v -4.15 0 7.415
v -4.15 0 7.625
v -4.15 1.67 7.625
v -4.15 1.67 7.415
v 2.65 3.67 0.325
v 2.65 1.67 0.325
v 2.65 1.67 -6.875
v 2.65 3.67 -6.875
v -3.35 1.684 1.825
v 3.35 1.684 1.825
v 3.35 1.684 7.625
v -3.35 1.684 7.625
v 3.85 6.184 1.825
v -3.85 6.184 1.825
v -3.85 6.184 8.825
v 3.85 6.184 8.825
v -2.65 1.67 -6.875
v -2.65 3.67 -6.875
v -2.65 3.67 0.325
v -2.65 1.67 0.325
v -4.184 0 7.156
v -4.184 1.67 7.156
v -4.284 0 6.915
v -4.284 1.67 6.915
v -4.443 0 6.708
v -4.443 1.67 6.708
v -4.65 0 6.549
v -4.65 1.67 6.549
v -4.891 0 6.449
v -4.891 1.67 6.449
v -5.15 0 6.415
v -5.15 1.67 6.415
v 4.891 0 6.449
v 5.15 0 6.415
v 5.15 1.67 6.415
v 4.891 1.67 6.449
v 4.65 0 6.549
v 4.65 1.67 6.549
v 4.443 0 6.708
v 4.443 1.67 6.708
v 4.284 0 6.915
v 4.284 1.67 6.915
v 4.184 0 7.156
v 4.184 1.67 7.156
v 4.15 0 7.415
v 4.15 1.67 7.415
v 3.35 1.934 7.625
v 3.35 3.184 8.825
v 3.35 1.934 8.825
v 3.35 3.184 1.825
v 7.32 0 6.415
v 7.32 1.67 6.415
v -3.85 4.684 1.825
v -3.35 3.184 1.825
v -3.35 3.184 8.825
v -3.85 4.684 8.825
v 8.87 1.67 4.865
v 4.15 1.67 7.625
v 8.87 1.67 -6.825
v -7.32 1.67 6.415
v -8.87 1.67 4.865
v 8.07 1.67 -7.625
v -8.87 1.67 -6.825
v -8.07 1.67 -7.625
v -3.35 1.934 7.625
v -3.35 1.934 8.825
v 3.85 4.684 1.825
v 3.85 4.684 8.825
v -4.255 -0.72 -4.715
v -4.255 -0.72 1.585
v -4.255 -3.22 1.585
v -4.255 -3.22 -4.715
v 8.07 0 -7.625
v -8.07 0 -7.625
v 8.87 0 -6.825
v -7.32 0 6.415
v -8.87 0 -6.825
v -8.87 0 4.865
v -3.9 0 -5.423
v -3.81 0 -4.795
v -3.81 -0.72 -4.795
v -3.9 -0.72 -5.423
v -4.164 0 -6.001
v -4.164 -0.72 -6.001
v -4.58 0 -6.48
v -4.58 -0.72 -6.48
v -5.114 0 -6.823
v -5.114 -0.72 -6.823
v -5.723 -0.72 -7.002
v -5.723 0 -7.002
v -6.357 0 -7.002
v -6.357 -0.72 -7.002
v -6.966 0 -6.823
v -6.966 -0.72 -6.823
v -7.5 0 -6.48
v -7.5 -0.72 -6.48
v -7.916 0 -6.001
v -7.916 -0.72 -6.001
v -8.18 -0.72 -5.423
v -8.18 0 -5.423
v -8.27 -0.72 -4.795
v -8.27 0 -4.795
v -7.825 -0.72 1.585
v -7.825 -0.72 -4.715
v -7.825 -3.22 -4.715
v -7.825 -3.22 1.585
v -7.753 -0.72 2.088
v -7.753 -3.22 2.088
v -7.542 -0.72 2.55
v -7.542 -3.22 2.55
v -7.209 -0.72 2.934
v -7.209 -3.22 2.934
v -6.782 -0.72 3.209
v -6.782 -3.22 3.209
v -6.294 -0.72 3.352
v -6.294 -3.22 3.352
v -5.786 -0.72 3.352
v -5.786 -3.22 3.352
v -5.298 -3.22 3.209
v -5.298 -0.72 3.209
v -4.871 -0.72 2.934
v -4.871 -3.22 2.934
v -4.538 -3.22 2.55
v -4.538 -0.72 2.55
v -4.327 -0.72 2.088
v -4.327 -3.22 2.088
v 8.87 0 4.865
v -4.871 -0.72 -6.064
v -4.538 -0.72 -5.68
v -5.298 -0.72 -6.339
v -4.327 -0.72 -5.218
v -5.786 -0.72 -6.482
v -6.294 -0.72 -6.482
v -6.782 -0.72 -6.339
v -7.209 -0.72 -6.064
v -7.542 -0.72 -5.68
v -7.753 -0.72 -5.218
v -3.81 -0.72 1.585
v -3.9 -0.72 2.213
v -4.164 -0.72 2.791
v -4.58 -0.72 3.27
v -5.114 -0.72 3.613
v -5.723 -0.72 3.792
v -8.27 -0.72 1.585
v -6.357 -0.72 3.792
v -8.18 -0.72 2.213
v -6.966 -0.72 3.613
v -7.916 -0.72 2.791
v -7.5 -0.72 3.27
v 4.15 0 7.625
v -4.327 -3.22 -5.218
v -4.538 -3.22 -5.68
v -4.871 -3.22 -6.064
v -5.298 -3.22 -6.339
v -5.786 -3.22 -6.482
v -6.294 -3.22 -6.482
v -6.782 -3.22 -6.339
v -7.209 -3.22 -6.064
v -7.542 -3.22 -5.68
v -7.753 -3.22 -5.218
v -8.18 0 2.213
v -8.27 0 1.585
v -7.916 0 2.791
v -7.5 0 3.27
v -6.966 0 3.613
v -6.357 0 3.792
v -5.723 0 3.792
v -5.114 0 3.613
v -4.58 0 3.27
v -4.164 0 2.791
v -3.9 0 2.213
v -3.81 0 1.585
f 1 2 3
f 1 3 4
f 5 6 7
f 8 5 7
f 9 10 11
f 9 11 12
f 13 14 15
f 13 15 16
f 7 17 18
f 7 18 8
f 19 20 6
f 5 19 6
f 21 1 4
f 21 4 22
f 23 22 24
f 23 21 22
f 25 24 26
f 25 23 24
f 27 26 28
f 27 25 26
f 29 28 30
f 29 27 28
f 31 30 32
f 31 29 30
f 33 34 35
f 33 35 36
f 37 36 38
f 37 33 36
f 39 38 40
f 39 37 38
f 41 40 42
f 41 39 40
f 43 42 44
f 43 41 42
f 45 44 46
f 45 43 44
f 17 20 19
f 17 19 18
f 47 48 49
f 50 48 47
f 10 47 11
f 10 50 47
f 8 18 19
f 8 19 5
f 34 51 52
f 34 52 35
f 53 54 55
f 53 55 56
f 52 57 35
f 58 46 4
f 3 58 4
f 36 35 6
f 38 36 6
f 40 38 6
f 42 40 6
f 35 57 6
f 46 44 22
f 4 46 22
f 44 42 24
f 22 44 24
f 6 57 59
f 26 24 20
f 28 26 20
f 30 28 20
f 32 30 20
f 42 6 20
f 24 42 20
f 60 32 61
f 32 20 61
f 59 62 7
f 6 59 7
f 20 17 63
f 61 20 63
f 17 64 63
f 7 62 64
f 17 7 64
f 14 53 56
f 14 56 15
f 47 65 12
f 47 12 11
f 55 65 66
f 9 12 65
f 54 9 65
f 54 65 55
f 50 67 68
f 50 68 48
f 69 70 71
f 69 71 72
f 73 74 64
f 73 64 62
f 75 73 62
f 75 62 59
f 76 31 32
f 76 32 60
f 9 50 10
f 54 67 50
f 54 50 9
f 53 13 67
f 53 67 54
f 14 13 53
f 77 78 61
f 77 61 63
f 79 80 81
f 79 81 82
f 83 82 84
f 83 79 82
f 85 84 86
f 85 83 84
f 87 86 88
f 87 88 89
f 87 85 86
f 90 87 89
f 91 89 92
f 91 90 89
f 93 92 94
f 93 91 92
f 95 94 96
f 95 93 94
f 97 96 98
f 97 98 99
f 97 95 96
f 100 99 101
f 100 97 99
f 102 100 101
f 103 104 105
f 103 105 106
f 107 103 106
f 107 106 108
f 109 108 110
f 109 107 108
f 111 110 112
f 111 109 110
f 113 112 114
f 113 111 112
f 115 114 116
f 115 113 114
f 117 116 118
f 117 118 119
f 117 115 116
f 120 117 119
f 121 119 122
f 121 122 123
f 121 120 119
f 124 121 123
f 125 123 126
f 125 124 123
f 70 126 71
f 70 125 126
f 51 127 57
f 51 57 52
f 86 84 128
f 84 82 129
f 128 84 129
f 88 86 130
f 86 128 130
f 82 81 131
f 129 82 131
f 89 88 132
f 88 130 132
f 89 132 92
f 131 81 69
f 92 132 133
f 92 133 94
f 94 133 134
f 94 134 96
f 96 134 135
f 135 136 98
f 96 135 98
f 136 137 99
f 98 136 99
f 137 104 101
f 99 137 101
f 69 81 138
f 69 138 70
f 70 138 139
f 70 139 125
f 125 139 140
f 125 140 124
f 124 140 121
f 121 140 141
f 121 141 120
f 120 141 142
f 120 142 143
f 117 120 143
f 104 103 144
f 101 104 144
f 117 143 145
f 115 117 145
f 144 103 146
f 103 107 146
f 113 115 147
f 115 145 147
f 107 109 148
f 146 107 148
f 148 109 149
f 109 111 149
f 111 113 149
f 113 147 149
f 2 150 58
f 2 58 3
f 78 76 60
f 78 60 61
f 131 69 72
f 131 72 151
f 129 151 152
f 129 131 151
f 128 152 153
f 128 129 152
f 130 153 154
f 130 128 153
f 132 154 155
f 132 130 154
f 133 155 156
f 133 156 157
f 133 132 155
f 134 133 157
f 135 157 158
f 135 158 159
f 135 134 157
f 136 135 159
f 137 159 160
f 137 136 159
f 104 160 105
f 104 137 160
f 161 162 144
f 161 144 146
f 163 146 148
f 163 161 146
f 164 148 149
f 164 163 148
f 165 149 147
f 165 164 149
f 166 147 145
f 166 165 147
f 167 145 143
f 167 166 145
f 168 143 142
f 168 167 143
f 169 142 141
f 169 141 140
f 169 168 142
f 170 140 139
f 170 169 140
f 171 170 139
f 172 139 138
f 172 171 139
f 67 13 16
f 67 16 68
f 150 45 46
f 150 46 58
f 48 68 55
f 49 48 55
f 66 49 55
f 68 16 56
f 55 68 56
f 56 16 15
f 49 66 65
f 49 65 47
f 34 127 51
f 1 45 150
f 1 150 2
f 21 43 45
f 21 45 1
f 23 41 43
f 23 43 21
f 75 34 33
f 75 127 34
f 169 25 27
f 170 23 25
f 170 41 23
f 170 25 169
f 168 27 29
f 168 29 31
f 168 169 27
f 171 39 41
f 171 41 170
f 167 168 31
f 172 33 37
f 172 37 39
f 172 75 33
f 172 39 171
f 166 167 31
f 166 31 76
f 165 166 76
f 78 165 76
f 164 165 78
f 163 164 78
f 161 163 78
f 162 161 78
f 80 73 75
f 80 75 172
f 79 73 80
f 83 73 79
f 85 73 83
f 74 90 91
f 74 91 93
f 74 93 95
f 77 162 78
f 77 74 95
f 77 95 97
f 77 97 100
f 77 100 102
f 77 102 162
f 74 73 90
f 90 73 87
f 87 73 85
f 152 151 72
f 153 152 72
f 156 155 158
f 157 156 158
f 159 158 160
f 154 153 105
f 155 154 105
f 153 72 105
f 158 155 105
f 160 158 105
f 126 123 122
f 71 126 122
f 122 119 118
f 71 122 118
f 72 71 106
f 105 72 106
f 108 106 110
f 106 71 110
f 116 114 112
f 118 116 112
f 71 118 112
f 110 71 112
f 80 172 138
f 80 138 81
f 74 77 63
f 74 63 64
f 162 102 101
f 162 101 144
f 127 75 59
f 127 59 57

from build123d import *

# Parameters (mm, degrees)
PCB_DEPTH           = 1.67
SKETCH2_W           = 5.3
SKETCH2_H           = 7.2
PIC18_DEPTH         = 2
CRYSTAL_DEPTH       = 0.72
BOSS_EXTRUDE4_DEPTH = 2.5
USB_CONNECTOR_DEPTH = 7
SKETCH6_W           = 6.7
SKETCH6_H           = 0.25
CUT_EXTRUDE1_DEPTH  = 1.2


with BuildPart() as part:
    # PCB Sketch → PCB (new body)
    with BuildSketch(Plane(origin=(0, 0, 0), x_dir=(1, 0, 0), z_dir=(0, 1, 0))):
        with BuildLine():
            Line((-8.07, 7.625), (8.07, 7.625))
            Line((8.07, 7.625), (8.87, 6.825))
            Line((8.87, 6.825), (8.87, -4.865))
            Line((8.87, -4.865), (7.32, -6.415))
            Line((7.32, -6.415), (5.15, -6.415))
            ThreePointArc((5.15, -6.415), (4.442893219, -6.707893219), (4.15, -7.415))
            Line((4.15, -7.415), (4.15, -7.625))
            Line((4.15, -7.625), (-4.15, -7.625))
            Line((-4.15, -7.625), (-4.15, -7.415))
            ThreePointArc((-4.15, -7.415), (-4.442893219, -6.707893219), (-5.15, -6.415))
            Line((-5.15, -6.415), (-7.32, -6.415))
            Line((-7.32, -6.415), (-8.87, -4.865))
            Line((-8.87, -4.865), (-8.87, 6.825))
            Line((-8.87, 6.825), (-8.07, 7.625))
        make_face()
    extrude(amount=PCB_DEPTH)

    # Sketch2 → PIC18 (add)
    with BuildSketch(Plane(origin=(0, 1.67, 0), x_dir=(1, 0, 0), z_dir=(0, 1, 0))):
        with Locations((0, 3.275)):
            Rectangle(SKETCH2_W, SKETCH2_H)
    extrude(amount=PIC18_DEPTH)

    # Sketch3 → Crystal (add)
    with BuildSketch(Plane.XZ):
        with BuildLine():
            Line((-3.81, 1.585), (-3.81, -4.795))
            ThreePointArc((-3.81, -4.795), (-6.04, -7.025), (-8.27, -4.795))
            Line((-8.27, -4.795), (-8.27, 1.585))
            ThreePointArc((-8.27, 1.585), (-6.04, 3.815), (-3.81, 1.585))
        make_face()
    extrude(amount=CRYSTAL_DEPTH)

    # Sketch5 → Boss-Extrude4 (add)
    with BuildSketch(Plane.XZ.offset(0.72)):
        with BuildLine():
            Line((-4.255, 1.585), (-4.255, -4.715))
            ThreePointArc((-4.255, -4.715), (-6.04, -6.5), (-7.825, -4.715))
            Line((-7.825, -4.715), (-7.825, 1.585))
            ThreePointArc((-7.825, 1.585), (-6.04, 3.37), (-4.255, 1.585))
        make_face()
    extrude(amount=BOSS_EXTRUDE4_DEPTH)


with BuildPart() as body_2:
    # 3DSketch1 → USB Connector (new body)
    with BuildSketch(Plane(origin=(-3.849621322, 6.184444439, 1.825), x_dir=(0.847998304005088, -0.52999894000318, 0), z_dir=(0, 0, 1))):
        Polygon((0, 0), (6.529586941, 4.080991838), (7.324585351, 2.808994382), (7.695584609, 1.271997456), (8.490583019, 0), (2.808994382, -3.550992898), (2.013995972, -2.278995442), (0.79499841, -1.271997456), align=None)
    extrude(amount=USB_CONNECTOR_DEPTH)

    # Sketch6 → Cut-Extrude1 (cut)
    with BuildSketch(Plane.XY.offset(8.825)):
        with Locations((0.000378678, 1.809444439)):
            Rectangle(SKETCH6_W, SKETCH6_H)
    extrude(amount=-CUT_EXTRUDE1_DEPTH, mode=Mode.SUBTRACT)


solid = Compound([part.part, body_2.part])
